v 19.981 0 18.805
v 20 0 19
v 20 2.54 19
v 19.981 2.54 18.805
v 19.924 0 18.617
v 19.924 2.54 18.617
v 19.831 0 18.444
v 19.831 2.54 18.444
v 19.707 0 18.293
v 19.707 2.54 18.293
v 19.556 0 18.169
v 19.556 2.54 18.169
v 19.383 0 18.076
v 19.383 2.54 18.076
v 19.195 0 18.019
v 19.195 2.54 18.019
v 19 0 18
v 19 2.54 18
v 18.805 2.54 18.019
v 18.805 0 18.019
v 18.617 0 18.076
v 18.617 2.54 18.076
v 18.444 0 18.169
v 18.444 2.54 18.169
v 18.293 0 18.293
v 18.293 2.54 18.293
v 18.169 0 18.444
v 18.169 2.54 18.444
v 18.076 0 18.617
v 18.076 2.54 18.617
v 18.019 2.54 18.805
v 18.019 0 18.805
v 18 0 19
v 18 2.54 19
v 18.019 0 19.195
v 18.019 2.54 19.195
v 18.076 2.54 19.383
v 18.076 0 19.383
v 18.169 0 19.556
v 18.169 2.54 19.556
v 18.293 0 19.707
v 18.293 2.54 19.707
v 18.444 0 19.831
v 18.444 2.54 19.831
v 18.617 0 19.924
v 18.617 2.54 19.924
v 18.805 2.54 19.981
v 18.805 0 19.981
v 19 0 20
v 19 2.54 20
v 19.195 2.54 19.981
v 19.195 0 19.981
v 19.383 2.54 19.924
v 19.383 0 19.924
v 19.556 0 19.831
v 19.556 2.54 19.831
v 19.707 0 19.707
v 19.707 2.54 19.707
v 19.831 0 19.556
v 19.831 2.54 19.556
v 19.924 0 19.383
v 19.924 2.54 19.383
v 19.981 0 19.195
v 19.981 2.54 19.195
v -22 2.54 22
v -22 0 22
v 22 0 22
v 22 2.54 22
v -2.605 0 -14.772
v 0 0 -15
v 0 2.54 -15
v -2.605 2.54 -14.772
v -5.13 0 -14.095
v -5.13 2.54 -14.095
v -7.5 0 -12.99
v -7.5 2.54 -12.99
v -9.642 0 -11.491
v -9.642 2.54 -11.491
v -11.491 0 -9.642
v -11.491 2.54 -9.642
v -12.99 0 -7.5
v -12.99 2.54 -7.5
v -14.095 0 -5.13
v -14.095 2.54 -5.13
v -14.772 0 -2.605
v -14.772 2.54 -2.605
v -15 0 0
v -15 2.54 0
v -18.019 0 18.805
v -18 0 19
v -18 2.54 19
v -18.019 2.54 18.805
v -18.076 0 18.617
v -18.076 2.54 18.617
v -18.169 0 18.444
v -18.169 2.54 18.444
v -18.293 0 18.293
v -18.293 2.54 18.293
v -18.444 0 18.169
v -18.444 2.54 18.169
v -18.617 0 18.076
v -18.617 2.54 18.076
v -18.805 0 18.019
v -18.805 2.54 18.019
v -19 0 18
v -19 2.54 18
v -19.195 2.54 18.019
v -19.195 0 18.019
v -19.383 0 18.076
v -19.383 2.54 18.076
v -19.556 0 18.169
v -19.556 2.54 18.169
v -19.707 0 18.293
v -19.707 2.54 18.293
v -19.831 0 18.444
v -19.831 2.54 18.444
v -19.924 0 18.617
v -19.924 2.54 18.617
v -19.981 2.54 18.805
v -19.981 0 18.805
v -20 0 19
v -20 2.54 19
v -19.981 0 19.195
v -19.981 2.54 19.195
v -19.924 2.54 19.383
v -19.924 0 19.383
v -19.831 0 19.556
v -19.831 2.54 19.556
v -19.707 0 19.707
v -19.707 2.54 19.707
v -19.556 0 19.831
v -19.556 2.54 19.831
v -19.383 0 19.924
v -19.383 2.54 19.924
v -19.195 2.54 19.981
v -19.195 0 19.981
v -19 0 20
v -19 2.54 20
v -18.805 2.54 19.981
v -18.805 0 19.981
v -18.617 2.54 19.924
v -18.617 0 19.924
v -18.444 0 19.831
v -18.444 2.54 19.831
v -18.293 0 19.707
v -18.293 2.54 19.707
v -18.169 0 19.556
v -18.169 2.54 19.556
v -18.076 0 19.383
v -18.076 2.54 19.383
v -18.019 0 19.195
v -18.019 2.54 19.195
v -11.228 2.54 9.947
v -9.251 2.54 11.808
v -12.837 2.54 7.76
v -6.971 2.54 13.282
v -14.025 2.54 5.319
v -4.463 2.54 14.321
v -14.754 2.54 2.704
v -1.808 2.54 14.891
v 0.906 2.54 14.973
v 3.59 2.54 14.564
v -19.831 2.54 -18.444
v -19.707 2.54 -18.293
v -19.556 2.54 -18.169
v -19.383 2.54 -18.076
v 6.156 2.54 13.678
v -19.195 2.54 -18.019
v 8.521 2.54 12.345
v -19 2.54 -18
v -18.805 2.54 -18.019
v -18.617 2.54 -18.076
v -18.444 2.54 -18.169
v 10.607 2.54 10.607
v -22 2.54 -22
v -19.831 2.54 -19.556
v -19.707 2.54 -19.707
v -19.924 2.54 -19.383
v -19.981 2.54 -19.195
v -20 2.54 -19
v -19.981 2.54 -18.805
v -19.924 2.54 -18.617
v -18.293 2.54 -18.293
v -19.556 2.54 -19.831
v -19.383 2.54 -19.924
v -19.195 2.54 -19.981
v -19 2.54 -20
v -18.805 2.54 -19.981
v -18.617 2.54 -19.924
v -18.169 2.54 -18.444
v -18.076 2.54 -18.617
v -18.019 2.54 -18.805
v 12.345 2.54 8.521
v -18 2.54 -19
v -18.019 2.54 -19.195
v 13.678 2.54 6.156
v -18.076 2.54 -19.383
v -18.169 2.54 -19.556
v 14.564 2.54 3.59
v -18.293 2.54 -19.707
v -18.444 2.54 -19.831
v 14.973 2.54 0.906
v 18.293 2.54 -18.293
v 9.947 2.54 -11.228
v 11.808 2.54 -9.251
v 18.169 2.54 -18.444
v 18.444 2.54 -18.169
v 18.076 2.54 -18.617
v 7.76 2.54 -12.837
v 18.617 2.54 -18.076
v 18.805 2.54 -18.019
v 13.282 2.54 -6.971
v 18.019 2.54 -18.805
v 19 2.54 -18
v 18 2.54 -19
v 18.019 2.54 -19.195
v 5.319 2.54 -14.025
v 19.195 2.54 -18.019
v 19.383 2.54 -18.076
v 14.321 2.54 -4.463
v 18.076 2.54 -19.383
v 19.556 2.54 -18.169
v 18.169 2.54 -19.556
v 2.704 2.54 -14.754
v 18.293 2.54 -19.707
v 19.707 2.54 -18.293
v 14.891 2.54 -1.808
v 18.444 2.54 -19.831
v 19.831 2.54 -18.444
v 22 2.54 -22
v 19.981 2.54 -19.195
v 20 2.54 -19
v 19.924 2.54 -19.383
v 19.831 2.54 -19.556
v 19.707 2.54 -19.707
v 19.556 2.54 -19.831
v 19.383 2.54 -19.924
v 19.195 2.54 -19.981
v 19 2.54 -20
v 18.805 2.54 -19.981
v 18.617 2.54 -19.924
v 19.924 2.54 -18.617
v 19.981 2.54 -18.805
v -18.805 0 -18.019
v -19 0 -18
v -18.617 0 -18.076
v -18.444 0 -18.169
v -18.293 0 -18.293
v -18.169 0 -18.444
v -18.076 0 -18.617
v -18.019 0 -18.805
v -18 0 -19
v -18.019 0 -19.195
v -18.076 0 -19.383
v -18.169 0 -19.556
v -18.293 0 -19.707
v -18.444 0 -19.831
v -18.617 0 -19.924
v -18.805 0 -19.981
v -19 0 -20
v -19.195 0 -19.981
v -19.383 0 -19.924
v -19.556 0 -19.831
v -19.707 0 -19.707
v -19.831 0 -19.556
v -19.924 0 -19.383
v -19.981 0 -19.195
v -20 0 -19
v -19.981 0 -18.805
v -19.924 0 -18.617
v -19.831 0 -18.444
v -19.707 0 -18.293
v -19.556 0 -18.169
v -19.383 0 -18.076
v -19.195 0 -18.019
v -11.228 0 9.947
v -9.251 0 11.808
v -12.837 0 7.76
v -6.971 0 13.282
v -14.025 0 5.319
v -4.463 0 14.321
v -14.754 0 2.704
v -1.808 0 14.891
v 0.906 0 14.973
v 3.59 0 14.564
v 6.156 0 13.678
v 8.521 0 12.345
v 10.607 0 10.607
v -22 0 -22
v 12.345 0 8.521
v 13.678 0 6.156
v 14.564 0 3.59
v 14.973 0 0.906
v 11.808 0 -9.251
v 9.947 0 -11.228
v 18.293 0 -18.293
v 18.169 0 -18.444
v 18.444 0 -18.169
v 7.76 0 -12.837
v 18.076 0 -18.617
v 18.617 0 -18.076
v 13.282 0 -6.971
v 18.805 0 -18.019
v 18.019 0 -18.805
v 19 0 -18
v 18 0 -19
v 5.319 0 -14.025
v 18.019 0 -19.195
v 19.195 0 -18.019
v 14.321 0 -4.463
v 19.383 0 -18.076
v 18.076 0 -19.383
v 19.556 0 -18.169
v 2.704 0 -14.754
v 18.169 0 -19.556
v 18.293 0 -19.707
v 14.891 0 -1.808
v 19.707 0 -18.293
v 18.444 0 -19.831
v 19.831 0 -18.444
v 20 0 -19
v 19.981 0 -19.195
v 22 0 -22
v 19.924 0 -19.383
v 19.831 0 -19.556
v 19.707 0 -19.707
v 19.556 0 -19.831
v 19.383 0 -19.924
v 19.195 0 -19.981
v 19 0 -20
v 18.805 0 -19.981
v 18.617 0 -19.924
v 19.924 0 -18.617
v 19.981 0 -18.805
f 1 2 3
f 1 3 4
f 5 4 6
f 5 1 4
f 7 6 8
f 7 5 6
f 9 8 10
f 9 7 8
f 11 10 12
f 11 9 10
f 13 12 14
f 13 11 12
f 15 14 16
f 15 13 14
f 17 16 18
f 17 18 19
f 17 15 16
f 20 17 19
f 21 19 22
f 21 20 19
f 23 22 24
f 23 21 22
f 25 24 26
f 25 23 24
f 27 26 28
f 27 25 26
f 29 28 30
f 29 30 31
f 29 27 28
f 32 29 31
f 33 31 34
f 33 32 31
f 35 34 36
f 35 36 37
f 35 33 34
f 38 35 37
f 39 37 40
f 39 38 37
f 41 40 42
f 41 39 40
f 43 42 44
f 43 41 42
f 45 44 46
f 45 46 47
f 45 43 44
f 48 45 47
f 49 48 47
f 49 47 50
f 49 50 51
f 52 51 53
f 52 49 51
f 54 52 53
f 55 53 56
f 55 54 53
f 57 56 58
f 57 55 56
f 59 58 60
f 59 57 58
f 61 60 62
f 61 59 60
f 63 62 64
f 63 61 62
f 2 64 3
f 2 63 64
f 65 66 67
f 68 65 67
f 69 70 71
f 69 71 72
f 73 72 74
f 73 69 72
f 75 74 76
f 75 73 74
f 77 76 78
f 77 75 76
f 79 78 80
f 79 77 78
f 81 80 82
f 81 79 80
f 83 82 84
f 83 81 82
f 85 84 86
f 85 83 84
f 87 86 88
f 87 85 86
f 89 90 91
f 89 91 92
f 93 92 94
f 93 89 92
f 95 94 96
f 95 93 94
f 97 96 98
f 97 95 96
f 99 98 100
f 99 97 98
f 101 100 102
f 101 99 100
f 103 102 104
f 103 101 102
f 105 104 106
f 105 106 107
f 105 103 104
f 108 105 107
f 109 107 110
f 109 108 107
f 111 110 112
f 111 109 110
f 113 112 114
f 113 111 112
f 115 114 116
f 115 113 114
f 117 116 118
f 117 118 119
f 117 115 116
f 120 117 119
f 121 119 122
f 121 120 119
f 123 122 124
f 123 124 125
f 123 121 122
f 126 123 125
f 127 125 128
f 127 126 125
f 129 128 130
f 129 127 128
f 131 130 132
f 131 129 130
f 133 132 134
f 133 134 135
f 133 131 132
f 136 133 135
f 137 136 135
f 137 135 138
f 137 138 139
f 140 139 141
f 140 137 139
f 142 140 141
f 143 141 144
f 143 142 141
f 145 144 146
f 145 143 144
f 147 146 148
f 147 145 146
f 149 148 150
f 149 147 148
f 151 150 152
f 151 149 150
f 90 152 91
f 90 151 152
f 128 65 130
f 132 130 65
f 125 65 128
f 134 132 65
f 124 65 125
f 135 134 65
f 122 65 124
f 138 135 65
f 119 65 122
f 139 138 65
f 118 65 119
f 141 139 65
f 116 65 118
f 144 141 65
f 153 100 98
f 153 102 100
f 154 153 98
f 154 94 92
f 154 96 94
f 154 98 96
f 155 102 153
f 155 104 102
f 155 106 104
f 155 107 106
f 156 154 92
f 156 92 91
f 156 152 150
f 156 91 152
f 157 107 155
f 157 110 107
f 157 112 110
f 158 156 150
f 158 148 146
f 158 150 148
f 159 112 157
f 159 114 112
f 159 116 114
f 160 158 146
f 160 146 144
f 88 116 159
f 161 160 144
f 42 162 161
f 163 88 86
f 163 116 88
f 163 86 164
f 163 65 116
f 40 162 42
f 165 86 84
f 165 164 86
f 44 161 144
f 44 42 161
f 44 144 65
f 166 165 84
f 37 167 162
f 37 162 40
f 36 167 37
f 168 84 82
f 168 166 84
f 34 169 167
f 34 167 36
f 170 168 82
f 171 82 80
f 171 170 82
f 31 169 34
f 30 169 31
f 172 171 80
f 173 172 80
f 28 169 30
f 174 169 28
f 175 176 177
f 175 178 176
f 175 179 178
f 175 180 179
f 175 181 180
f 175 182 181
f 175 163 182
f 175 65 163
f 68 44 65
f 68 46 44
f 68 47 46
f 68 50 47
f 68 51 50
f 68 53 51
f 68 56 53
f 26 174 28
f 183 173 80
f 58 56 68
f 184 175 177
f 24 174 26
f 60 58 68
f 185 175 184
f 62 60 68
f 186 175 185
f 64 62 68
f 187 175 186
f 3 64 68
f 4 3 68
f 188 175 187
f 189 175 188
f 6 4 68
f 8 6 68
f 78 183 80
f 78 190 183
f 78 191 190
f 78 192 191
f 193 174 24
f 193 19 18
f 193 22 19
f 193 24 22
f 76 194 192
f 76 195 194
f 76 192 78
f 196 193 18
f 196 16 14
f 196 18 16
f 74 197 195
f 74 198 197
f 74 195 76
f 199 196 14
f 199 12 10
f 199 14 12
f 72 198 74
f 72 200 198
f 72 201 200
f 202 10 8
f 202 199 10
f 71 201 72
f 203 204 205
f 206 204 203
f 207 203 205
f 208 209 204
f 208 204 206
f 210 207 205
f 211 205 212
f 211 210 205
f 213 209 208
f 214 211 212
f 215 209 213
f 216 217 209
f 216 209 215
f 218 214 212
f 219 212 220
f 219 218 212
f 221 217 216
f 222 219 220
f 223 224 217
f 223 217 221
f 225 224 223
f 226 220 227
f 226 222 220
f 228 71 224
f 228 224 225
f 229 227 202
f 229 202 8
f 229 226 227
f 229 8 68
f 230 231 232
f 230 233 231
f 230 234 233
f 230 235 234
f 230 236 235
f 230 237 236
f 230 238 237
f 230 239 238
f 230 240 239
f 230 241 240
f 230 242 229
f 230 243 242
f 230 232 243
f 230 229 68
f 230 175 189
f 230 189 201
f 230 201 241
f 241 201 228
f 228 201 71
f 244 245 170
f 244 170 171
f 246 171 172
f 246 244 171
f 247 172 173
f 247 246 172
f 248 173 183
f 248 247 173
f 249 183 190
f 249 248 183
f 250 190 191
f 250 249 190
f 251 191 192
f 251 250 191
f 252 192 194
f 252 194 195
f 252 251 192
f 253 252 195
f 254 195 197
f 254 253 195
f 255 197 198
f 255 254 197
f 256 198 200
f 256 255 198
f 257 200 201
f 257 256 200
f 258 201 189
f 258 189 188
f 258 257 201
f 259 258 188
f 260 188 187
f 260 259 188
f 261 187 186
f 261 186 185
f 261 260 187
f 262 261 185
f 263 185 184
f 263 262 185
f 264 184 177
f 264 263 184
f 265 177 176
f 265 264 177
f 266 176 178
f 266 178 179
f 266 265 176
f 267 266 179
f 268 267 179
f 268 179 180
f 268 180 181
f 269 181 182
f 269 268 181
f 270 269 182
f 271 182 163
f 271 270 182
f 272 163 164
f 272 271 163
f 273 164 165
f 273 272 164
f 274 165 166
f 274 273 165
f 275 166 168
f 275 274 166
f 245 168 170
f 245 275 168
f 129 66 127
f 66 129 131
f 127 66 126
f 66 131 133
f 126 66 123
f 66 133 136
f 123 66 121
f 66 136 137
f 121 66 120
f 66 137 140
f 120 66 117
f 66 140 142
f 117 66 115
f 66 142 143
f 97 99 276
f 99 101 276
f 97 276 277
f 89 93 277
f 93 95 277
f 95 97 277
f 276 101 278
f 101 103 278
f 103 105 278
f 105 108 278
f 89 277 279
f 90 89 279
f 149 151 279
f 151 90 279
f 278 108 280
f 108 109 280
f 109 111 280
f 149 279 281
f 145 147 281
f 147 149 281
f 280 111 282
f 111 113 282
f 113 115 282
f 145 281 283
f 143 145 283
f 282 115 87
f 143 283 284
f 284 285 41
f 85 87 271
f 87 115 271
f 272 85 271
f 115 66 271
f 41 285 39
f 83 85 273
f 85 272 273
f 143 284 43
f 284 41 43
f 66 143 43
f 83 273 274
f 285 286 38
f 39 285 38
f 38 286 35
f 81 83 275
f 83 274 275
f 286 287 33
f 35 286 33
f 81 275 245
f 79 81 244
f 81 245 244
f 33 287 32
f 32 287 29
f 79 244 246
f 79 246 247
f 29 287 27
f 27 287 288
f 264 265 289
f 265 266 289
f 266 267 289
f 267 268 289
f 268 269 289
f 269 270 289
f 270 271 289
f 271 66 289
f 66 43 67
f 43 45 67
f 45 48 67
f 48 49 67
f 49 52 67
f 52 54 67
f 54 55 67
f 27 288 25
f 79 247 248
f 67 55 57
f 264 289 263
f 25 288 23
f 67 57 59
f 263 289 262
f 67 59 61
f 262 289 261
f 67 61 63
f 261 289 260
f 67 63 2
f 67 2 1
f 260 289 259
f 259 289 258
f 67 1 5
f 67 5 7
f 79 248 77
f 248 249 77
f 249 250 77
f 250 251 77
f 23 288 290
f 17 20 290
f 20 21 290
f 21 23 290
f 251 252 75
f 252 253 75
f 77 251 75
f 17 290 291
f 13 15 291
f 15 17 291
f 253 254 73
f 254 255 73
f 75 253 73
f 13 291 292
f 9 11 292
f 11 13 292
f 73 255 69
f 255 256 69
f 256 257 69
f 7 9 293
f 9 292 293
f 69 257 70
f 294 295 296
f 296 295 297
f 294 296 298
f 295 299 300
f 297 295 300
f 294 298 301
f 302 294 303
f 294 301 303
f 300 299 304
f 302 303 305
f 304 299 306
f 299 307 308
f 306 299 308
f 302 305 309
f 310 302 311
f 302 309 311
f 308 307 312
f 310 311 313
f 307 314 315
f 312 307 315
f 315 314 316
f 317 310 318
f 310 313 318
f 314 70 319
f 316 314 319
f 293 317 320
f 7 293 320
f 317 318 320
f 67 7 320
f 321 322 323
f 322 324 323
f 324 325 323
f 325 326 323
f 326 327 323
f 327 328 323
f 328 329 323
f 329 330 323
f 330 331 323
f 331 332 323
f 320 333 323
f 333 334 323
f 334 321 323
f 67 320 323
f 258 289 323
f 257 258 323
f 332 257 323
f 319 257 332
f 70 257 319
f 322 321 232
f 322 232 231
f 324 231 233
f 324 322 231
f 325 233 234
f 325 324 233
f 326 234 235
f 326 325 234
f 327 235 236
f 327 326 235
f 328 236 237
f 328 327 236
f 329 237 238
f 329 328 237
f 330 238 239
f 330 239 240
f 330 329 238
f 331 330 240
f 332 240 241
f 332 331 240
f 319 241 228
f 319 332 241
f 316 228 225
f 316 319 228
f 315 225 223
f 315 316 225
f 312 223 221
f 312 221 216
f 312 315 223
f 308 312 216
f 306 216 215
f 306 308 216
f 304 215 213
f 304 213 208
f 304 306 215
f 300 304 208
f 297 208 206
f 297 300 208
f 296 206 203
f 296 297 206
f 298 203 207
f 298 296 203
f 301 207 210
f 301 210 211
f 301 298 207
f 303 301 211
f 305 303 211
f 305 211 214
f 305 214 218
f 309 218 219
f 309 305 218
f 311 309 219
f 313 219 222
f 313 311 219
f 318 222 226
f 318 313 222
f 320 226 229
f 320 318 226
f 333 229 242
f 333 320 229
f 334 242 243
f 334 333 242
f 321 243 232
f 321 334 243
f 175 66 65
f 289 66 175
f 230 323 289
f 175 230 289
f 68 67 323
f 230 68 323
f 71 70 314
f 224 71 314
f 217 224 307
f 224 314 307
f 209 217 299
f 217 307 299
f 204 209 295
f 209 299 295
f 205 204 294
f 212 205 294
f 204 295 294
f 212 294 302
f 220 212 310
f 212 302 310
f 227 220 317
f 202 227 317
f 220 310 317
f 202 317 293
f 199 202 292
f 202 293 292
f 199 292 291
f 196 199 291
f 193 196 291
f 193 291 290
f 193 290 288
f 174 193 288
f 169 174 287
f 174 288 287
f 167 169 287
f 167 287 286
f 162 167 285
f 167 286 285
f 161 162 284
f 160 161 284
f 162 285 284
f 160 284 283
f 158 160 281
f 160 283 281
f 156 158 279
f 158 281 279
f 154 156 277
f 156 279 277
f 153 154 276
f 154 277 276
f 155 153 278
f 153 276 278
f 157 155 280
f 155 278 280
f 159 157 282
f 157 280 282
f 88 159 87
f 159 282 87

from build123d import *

# Parameters (mm, degrees)
SKETCH1_R           = 1
BOSS_EXTRUDE1_DEPTH = 2.54
MIRROR2_OUTLINE_R   = 1
MIRROR2_DEPTH       = 2.54


# Read off the part's stored shape, not the designer's step: Mirror2
with BuildPart() as part:
    # Sketch1 → Boss-Extrude1 (new body)
    with BuildSketch(Plane(origin=(0, 0, 0), x_dir=(1, 0, 0), z_dir=(0, 1, 0))):
        with BuildLine():
            Line((0, 22), (0, 15))
            ThreePointArc((0, 15), (-10.606601718, 10.606601718), (-15, 0))
            Line((-15, 0), (-22, 0))
            Line((-22, 0), (-22, 22))
            Line((-22, 22), (0, 22))
        make_face()
        with Locations(Location((-19, 19, 0), (0, 0, 270))):
            Circle(SKETCH1_R, mode=Mode.SUBTRACT)
    extrude(amount=BOSS_EXTRUDE1_DEPTH)

    # Mirror2 outline → Mirror2 (add)
    with BuildSketch(Plane(origin=(0, 0, 0), x_dir=(1, 0, 0), z_dir=(0, 1, 0))):
        with BuildLine():
            Line((22, 22), (0, 22))
            Line((0, 22), (0, 15))
            ThreePointArc((0, 15), (10.606601718, -10.606601718), (-15, 0))
            Line((-15, 0), (-22, 0))
            Line((-22, 0), (-22, -22))
            Line((-22, -22), (22, -22))
            Line((22, -22), (22, 22))
        make_face()
        with Locations((-19, -19)):
            Circle(MIRROR2_OUTLINE_R, mode=Mode.SUBTRACT)
        with Locations((19, -19)):
            Circle(MIRROR2_OUTLINE_R, mode=Mode.SUBTRACT)
        with Locations((19, 19)):
            Circle(MIRROR2_OUTLINE_R, mode=Mode.SUBTRACT)
    extrude(amount=MIRROR2_DEPTH)


solid = part.part
